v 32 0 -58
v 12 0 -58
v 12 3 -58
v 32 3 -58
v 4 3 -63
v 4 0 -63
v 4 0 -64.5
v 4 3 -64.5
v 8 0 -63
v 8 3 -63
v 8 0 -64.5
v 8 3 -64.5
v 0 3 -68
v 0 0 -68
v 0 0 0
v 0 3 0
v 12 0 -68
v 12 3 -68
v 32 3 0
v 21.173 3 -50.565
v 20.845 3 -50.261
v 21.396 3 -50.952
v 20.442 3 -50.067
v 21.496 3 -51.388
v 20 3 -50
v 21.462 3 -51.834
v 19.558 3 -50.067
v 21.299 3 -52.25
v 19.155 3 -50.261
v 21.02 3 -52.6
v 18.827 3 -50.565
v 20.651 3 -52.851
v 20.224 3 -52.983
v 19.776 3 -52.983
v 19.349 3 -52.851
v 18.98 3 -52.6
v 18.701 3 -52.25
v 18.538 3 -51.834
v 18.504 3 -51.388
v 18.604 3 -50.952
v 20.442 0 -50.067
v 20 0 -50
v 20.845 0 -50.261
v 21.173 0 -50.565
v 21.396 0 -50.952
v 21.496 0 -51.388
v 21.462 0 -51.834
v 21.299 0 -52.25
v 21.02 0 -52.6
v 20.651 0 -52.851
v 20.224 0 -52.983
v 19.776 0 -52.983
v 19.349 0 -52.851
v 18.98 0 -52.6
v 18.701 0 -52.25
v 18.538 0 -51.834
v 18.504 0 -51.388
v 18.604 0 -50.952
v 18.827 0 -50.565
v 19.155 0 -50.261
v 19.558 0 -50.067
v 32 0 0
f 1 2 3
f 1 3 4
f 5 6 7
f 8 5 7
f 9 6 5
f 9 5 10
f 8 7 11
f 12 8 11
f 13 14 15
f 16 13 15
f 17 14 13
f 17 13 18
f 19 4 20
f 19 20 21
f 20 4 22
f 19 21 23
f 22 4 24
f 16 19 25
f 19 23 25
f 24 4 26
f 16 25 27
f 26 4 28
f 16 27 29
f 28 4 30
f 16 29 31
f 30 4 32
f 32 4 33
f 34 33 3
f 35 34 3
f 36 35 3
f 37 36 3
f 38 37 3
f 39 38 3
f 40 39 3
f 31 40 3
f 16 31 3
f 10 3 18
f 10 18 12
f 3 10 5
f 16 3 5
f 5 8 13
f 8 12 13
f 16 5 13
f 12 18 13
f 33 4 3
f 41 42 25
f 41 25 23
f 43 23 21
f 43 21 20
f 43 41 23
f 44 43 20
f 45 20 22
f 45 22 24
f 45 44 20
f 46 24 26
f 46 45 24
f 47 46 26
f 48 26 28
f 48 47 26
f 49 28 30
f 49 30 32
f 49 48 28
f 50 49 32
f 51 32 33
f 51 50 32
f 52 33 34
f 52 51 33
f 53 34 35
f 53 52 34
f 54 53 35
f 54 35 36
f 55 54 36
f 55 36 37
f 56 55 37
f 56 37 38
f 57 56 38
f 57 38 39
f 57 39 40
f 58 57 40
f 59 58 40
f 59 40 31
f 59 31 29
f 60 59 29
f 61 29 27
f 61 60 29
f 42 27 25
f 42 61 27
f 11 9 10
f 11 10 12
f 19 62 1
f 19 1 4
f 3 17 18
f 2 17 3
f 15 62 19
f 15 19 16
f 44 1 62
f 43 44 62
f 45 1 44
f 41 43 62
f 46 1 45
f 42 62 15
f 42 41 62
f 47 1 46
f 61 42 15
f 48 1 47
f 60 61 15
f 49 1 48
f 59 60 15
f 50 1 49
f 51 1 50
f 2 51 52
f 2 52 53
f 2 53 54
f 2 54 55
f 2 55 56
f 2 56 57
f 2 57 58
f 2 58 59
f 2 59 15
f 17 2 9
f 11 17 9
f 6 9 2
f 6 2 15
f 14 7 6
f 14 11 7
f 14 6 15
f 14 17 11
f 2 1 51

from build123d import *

# Parameters (mm, degrees)
SKETCH1_R           = 1.5
SKETCH1_W           = 4
SKETCH1_H           = 1.5
BOSS_EXTRUDE1_DEPTH = 3
SKETCH3_W           = 12
SKETCH3_H           = 3
CUT_EXTRUDE2_DEPTH  = 82.049367672


with BuildPart() as part:
    # Sketch1 → Boss-Extrude1 (new body)
    with BuildSketch(Plane(origin=(0, 0, 0), x_dir=(1, 0, 0), z_dir=(0, 1, 0))):
        Polygon((0, 58), (0, 68), (12, 68), (12, 58), (44, 58), (44, 0), (0, 0), align=None)
        with Locations(Location((20, 51.5, 0), (0, 0, 270))):
            Circle(SKETCH1_R, mode=Mode.SUBTRACT)
        with Locations(Location((36, 51.5, 0), (0, 0, 270))):
            Circle(SKETCH1_R, mode=Mode.SUBTRACT)
        with Locations((6, 63.75)):
            Rectangle(SKETCH1_W, SKETCH1_H, mode=Mode.SUBTRACT)
    extrude(amount=BOSS_EXTRUDE1_DEPTH)

    # Sketch3 → Cut-Extrude2 (cut, through all)
    with BuildSketch(Plane.XY):
        with Locations((38, 1.5)):
            Rectangle(SKETCH3_W, SKETCH3_H)
    extrude(amount=-CUT_EXTRUDE2_DEPTH, mode=Mode.SUBTRACT)


solid = part.part
